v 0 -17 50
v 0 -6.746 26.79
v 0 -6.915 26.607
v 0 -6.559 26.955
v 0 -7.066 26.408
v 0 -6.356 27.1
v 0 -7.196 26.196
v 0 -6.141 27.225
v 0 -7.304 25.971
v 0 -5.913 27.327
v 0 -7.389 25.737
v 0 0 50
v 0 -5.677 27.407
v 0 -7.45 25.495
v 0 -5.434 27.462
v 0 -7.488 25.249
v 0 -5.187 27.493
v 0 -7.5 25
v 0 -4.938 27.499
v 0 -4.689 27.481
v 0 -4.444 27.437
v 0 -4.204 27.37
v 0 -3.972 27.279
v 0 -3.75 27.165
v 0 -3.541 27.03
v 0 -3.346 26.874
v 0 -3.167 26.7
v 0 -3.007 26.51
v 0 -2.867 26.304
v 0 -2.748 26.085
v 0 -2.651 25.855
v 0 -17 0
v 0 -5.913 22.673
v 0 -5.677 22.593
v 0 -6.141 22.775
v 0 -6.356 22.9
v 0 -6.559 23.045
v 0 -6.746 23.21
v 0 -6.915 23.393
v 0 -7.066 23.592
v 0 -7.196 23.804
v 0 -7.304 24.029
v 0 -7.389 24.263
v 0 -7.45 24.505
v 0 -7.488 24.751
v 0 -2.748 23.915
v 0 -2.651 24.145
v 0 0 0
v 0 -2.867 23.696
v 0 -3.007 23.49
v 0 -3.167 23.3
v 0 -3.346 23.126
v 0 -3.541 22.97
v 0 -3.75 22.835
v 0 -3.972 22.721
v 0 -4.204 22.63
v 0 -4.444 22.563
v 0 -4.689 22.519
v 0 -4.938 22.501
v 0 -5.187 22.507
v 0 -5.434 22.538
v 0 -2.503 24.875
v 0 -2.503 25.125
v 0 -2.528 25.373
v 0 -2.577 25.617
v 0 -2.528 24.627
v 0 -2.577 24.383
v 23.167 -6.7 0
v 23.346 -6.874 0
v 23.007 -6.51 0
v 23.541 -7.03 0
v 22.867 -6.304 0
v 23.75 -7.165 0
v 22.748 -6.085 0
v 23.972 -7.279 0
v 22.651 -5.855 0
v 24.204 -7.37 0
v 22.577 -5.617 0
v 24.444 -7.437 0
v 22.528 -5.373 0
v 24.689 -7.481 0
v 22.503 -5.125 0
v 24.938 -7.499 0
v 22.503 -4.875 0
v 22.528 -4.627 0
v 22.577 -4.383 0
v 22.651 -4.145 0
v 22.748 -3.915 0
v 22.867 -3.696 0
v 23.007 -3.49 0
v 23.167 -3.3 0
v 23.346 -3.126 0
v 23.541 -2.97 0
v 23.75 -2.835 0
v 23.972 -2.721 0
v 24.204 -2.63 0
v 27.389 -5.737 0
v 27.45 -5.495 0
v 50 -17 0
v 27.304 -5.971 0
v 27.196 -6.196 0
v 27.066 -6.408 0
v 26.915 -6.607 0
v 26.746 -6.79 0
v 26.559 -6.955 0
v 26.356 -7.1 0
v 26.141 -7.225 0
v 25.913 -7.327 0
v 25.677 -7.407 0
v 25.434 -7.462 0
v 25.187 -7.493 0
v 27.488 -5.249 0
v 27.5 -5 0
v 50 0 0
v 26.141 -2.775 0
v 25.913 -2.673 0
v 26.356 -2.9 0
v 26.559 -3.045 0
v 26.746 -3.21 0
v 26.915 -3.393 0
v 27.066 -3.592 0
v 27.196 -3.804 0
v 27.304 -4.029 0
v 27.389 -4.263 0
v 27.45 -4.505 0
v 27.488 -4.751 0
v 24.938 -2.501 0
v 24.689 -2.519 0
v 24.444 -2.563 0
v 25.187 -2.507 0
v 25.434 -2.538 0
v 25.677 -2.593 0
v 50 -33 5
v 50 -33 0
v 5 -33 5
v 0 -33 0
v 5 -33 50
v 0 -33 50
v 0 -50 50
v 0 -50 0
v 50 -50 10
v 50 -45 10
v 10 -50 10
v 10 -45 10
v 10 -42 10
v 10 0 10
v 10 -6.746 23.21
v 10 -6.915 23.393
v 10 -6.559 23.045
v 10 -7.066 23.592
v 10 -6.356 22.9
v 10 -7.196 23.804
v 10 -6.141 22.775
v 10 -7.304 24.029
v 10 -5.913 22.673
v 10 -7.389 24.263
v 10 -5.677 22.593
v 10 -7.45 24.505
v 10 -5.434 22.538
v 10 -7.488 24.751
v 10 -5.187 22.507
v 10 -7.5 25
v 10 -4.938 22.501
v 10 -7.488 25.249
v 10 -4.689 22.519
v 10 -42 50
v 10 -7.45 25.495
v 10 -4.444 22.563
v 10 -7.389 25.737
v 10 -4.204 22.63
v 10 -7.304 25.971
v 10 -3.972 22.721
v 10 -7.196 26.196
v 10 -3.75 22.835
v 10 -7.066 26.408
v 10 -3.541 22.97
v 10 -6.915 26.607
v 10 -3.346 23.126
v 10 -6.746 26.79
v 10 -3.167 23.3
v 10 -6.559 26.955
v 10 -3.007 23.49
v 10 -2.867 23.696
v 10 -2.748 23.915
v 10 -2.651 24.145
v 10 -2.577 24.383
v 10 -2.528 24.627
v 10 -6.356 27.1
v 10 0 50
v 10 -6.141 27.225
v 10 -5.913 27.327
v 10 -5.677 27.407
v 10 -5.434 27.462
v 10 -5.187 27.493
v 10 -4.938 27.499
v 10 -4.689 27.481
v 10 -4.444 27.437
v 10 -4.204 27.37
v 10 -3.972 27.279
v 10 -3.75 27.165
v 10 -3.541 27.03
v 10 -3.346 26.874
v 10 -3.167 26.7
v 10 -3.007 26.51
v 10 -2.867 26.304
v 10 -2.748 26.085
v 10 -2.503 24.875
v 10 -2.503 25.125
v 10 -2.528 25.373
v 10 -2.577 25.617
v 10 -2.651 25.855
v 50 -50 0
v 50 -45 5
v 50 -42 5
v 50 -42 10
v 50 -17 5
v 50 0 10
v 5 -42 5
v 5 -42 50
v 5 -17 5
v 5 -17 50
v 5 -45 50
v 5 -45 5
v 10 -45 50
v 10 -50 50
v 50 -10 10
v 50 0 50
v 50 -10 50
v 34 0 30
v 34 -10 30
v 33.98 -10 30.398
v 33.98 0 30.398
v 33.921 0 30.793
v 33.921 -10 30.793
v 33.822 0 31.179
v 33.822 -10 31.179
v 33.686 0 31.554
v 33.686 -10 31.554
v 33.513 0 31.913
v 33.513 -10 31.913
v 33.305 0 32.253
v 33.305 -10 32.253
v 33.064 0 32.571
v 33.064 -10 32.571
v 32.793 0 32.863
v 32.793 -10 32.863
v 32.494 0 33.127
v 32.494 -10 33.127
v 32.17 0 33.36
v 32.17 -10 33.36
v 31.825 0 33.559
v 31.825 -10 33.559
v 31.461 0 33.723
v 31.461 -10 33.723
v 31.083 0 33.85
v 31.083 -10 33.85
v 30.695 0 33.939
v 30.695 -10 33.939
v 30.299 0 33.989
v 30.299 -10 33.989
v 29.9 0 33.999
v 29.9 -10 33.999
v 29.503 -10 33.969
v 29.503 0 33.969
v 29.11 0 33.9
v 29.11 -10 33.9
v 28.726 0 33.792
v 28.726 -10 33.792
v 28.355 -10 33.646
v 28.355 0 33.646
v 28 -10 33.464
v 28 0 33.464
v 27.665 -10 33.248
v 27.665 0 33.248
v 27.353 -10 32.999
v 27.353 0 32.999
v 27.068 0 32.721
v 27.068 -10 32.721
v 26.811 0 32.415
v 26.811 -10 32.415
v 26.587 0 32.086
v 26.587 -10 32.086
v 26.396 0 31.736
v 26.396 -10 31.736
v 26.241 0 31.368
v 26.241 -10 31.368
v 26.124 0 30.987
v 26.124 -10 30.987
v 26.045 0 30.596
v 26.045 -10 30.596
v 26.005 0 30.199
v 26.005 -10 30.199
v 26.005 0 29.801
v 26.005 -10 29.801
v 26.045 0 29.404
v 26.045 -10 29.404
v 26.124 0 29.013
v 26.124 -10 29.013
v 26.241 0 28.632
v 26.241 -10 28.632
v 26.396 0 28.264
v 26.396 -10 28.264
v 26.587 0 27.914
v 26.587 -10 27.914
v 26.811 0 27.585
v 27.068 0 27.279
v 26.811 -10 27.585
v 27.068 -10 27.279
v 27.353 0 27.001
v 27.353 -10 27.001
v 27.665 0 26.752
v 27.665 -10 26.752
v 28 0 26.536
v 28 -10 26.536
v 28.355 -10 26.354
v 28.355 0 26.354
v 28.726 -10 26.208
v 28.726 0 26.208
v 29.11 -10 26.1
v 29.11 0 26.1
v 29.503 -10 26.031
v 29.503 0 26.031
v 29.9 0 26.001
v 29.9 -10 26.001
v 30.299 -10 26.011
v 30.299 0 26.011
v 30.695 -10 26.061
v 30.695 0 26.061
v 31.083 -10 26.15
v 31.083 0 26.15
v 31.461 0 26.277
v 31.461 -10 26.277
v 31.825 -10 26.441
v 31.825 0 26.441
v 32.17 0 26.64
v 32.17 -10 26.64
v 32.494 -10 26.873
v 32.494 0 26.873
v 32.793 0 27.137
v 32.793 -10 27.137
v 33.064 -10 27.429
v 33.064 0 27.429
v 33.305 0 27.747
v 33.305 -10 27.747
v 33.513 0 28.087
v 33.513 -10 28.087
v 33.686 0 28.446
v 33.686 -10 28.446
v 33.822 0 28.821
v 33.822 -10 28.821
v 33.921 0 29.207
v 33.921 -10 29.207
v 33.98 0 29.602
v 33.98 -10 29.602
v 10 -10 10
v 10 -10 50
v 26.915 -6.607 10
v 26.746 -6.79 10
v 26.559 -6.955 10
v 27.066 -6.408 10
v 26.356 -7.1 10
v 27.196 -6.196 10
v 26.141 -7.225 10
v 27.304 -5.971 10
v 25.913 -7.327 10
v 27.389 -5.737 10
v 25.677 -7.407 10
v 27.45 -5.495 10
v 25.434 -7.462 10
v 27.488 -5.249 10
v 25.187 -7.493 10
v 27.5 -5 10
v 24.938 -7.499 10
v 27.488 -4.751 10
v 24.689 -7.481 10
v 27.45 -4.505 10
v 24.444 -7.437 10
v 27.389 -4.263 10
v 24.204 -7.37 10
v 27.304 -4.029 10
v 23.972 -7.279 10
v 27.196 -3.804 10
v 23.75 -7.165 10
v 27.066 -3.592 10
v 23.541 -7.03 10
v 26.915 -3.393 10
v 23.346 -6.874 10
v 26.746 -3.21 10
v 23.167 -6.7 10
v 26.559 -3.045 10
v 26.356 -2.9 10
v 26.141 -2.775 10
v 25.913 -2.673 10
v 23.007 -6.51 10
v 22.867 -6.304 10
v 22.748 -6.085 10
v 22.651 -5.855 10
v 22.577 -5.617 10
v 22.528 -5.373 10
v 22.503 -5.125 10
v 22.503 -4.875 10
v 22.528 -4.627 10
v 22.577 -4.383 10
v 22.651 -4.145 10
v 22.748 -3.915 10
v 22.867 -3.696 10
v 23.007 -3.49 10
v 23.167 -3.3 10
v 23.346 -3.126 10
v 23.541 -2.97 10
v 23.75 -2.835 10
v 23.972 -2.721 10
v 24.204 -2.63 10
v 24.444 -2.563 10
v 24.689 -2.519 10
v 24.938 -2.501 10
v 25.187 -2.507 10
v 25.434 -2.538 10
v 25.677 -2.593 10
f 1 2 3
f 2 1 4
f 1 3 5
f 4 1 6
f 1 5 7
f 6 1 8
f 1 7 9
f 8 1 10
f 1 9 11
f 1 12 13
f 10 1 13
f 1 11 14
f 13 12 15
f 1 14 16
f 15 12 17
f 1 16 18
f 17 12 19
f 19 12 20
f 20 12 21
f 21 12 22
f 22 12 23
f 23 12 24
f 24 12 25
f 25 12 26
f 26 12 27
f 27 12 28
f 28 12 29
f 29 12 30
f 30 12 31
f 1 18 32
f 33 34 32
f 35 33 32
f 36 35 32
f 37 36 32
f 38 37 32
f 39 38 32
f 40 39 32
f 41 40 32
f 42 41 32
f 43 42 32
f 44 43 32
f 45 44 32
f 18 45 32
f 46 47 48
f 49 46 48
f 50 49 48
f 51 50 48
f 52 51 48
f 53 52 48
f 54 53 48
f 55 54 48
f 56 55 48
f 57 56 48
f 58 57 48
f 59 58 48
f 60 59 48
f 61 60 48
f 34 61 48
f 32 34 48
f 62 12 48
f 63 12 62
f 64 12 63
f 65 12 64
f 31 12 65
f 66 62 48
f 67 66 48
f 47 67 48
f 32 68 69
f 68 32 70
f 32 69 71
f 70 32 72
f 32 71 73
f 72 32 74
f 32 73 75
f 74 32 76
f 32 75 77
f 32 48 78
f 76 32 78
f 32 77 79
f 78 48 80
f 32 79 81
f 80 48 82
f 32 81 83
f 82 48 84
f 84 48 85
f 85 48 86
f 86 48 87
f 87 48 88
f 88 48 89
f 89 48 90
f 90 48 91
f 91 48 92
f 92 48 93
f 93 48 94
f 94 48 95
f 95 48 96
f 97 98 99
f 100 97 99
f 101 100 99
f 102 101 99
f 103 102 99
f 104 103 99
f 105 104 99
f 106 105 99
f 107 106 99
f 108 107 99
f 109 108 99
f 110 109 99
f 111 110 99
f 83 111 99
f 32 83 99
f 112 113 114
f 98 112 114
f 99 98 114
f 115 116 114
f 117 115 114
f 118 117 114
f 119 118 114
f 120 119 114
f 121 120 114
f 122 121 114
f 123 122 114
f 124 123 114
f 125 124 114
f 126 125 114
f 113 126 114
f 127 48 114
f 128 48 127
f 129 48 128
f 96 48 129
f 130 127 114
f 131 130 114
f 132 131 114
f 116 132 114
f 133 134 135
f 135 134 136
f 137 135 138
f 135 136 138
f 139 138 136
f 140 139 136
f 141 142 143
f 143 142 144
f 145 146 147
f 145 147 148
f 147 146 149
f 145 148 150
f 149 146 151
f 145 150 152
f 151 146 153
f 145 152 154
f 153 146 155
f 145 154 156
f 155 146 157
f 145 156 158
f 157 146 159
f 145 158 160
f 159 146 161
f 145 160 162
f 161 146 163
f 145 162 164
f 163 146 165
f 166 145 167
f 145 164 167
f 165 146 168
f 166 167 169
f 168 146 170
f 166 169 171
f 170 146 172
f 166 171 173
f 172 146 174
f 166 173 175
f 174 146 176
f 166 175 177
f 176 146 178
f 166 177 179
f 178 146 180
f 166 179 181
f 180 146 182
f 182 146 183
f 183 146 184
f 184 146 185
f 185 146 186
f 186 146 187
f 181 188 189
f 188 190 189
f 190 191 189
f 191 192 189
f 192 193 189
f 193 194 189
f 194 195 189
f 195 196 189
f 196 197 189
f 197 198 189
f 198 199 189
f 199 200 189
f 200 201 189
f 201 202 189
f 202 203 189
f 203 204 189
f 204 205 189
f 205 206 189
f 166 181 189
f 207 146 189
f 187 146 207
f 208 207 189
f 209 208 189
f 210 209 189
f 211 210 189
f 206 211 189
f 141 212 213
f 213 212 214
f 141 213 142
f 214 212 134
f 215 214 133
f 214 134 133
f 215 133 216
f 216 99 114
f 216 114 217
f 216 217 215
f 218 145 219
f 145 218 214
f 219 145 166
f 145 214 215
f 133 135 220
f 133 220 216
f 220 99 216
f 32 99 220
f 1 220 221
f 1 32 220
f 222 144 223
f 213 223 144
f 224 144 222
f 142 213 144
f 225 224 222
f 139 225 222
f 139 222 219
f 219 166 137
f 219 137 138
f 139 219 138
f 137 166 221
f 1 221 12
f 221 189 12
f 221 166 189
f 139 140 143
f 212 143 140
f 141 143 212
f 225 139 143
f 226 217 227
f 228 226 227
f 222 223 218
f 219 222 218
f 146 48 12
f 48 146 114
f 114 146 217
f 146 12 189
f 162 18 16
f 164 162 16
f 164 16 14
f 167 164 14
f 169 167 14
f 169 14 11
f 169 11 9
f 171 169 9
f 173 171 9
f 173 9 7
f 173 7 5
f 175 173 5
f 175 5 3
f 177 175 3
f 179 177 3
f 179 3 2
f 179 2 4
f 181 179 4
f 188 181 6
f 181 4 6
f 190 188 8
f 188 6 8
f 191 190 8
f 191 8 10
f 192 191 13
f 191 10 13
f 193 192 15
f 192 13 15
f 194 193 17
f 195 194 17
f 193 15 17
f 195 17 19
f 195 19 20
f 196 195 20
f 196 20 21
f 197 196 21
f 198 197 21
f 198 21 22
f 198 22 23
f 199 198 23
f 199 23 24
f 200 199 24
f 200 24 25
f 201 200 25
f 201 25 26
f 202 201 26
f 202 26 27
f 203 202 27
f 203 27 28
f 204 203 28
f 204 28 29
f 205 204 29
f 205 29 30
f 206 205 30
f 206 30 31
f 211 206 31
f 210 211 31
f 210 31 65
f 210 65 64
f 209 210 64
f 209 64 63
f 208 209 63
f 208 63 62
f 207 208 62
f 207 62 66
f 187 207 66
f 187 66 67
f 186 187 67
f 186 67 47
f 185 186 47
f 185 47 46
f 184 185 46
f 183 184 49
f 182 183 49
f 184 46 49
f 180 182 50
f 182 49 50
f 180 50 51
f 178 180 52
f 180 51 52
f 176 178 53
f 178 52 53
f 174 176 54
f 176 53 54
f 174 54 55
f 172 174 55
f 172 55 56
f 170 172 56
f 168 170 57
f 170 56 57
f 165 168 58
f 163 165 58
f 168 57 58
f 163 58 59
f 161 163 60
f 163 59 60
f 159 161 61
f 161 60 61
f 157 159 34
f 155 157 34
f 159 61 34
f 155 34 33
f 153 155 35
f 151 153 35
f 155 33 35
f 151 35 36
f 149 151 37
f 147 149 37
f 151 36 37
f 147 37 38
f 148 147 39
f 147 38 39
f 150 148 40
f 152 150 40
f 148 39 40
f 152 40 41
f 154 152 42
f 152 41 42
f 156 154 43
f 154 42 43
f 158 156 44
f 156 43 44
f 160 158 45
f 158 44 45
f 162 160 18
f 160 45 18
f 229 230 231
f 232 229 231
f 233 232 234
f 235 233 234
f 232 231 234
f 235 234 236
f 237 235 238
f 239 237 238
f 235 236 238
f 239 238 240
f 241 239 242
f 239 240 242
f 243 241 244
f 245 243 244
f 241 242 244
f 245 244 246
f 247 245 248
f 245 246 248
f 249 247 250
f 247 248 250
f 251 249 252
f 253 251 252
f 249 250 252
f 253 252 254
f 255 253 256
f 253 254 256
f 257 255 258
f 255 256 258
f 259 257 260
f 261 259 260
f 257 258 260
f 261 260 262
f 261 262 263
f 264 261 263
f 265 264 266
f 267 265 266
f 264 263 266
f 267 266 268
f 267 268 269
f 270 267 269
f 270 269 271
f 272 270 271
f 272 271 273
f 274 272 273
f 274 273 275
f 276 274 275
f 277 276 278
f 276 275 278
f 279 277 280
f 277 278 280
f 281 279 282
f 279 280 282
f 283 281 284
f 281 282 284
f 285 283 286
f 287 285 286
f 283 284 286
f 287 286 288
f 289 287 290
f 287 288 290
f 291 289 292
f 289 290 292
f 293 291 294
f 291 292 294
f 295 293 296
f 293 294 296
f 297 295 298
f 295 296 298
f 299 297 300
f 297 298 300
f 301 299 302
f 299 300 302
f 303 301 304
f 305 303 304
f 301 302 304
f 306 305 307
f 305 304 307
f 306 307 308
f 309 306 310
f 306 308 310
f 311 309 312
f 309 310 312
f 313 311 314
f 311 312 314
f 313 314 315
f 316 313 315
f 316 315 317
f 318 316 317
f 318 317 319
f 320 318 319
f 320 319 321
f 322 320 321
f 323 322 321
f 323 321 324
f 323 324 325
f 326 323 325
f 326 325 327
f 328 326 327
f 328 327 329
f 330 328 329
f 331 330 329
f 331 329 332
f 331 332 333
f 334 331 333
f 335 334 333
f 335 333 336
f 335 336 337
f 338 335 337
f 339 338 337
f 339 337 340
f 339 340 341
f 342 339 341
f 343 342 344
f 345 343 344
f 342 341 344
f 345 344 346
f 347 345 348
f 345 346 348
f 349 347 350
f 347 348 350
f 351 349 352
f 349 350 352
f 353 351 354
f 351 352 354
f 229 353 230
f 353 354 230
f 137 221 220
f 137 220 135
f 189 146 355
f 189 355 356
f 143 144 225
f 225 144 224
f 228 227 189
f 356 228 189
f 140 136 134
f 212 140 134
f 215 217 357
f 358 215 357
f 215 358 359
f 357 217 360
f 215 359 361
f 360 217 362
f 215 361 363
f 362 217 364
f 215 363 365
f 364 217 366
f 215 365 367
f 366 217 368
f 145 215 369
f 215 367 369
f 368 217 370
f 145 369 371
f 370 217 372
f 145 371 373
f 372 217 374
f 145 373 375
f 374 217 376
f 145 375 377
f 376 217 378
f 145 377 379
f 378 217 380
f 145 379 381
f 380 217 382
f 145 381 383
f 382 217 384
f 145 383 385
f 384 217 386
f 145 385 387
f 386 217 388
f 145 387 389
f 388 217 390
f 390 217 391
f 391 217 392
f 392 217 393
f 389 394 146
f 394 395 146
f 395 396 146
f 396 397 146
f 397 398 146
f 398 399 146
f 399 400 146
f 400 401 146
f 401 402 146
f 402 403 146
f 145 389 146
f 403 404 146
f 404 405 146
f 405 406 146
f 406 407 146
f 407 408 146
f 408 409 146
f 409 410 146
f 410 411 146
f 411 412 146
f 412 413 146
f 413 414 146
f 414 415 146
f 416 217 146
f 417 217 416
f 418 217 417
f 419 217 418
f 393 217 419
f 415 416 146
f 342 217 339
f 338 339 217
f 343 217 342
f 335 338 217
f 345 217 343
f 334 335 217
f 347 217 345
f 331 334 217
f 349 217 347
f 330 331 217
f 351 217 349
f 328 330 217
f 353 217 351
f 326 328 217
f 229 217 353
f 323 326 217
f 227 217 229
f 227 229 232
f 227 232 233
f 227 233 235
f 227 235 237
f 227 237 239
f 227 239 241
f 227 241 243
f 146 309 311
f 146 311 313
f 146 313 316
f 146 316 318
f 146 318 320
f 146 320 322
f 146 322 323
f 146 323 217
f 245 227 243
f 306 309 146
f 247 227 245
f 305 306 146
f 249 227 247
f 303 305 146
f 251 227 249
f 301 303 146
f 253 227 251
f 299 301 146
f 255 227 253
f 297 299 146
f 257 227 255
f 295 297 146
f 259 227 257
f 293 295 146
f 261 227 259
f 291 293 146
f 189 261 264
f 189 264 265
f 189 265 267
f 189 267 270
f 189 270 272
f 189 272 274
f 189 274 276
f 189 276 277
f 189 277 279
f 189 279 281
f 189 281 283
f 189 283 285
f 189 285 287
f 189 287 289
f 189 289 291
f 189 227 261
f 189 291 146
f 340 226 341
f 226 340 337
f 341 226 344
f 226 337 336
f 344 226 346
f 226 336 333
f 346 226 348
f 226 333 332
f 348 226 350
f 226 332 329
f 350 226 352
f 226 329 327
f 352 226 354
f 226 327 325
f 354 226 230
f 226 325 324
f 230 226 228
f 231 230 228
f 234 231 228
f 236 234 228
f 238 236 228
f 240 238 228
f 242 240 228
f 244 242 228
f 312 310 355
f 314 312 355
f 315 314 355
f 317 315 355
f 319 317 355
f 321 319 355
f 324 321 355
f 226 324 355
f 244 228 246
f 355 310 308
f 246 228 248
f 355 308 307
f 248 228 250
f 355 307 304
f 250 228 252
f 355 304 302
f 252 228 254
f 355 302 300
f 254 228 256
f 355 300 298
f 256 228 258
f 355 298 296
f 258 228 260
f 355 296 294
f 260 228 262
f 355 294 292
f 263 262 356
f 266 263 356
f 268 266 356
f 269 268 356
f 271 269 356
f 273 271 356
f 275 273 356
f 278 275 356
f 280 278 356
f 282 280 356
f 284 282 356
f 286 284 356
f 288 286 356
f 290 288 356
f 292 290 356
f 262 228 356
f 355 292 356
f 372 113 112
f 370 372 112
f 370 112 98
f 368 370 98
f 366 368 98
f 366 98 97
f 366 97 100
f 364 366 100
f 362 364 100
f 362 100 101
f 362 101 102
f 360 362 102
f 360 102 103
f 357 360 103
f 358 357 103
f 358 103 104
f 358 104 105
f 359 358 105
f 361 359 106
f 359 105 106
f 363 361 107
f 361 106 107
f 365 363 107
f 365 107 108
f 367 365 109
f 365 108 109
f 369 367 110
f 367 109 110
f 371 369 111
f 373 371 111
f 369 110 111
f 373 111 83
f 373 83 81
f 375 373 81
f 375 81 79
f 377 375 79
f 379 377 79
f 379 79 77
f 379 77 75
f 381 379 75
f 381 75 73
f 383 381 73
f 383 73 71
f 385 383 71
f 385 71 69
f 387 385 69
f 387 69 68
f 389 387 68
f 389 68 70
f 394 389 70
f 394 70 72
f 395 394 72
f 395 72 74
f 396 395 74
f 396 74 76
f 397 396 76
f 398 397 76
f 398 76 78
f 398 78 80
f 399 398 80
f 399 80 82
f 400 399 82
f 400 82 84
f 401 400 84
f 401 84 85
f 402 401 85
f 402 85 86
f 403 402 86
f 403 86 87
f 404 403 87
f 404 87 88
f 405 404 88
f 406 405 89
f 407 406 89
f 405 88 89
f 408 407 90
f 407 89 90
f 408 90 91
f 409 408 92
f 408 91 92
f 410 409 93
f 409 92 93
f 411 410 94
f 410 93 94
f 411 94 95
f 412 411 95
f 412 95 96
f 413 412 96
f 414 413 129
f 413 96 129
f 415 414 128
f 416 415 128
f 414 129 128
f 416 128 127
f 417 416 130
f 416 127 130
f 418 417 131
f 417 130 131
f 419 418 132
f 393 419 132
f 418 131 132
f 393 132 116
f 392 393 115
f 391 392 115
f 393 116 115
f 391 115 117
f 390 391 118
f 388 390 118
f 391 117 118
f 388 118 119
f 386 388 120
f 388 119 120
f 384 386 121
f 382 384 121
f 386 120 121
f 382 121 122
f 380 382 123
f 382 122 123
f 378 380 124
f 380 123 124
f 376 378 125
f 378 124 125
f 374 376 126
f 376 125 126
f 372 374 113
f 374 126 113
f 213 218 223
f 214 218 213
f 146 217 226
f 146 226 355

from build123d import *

# Parameters (mm, degrees)
F1_DEPTH  = 50
F2_W      = 3
F2_H      = 40
F3_DEPTH  = 5
F5_DEPTH  = 5
F6_W      = 40
F6_H      = 40
F7_DEPTH  = 10
F8_R      = 4
F9_DEPTH  = 10
F10_W     = 16
F10_H     = 50
F11_DEPTH = 5
F12_W     = 45
F12_H     = 16
F13_DEPTH = 5
F14_R     = 2.5
F15_DEPTH = 25
F16_R     = 2.5
F17_DEPTH = 25


with BuildPart() as f1:
    # F0 (on Front) → F1 (new body)
    with BuildSketch(Plane.XZ):
        Polygon((0, 50), (0, 0), (50, 0), (50, 10), (10, 10), (10, 50), align=None)
    extrude(amount=F1_DEPTH)

    # F2 (on face) → F3 (cut)
    with BuildSketch(Plane.YZ.offset(10)):
        with Locations((-43.5, 30)):
            Rectangle(F2_W, F2_H)
    extrude(amount=-F3_DEPTH, mode=Mode.SUBTRACT)

    # F4 (on face) → F5 (cut)
    with BuildSketch(Plane.XY.offset(10)):
        Polygon((5, -45), (10, -45), (50, -45), (50, -42), (10, -42), (5, -42), align=None)
    extrude(amount=-F5_DEPTH, mode=Mode.SUBTRACT)

    # F10 (on face) → F11 (cut)
    with BuildSketch(Plane(origin=(0, 0, 0), x_dir=(0, -1, 0), z_dir=(-1, 0, 0))):
        with Locations((25, 25)):
            Rectangle(F10_W, F10_H)
    extrude(amount=-F11_DEPTH, mode=Mode.SUBTRACT)

    # F12 (on face) → F13 (cut)
    with BuildSketch(Plane(origin=(0, 0, 0), x_dir=(1, 0, 0), z_dir=(0, 0, -1))):
        with Locations((27.5, 25)):
            Rectangle(F12_W, F12_H)
    extrude(amount=-F13_DEPTH, mode=Mode.SUBTRACT)

    # F14 (on face) → F15 (cut)
    with BuildSketch(Plane(origin=(0, 0, 0), x_dir=(0, -1, 0), z_dir=(-1, 0, 0))):
        with Locations((5, 25)):
            Circle(F14_R)
    extrude(amount=-F15_DEPTH, mode=Mode.SUBTRACT)

    # F16 (on face) → F17 (cut)
    with BuildSketch(Plane(origin=(0, 0, 0), x_dir=(1, 0, 0), z_dir=(0, 0, -1))):
        with Locations((25, 5)):
            Circle(F16_R)
    extrude(amount=-F17_DEPTH, mode=Mode.SUBTRACT)


with BuildPart() as f7:
    # F6 (on face) → F7 (new body)
    with BuildSketch(Plane(origin=(0, 0, 0), x_dir=(-1, 0, 0), z_dir=(0, 1, 0))):
        with Locations((-30, 30)):
            Rectangle(F6_W, F6_H)
    extrude(amount=-F7_DEPTH)

    # F8 (on face) → F9 (cut)
    with BuildSketch(Plane.XZ.offset(10)):
        with Locations((30, 30)):
            Circle(F8_R)
    extrude(amount=-F9_DEPTH, mode=Mode.SUBTRACT)


solid = Compound([f1.part, f7.part])
